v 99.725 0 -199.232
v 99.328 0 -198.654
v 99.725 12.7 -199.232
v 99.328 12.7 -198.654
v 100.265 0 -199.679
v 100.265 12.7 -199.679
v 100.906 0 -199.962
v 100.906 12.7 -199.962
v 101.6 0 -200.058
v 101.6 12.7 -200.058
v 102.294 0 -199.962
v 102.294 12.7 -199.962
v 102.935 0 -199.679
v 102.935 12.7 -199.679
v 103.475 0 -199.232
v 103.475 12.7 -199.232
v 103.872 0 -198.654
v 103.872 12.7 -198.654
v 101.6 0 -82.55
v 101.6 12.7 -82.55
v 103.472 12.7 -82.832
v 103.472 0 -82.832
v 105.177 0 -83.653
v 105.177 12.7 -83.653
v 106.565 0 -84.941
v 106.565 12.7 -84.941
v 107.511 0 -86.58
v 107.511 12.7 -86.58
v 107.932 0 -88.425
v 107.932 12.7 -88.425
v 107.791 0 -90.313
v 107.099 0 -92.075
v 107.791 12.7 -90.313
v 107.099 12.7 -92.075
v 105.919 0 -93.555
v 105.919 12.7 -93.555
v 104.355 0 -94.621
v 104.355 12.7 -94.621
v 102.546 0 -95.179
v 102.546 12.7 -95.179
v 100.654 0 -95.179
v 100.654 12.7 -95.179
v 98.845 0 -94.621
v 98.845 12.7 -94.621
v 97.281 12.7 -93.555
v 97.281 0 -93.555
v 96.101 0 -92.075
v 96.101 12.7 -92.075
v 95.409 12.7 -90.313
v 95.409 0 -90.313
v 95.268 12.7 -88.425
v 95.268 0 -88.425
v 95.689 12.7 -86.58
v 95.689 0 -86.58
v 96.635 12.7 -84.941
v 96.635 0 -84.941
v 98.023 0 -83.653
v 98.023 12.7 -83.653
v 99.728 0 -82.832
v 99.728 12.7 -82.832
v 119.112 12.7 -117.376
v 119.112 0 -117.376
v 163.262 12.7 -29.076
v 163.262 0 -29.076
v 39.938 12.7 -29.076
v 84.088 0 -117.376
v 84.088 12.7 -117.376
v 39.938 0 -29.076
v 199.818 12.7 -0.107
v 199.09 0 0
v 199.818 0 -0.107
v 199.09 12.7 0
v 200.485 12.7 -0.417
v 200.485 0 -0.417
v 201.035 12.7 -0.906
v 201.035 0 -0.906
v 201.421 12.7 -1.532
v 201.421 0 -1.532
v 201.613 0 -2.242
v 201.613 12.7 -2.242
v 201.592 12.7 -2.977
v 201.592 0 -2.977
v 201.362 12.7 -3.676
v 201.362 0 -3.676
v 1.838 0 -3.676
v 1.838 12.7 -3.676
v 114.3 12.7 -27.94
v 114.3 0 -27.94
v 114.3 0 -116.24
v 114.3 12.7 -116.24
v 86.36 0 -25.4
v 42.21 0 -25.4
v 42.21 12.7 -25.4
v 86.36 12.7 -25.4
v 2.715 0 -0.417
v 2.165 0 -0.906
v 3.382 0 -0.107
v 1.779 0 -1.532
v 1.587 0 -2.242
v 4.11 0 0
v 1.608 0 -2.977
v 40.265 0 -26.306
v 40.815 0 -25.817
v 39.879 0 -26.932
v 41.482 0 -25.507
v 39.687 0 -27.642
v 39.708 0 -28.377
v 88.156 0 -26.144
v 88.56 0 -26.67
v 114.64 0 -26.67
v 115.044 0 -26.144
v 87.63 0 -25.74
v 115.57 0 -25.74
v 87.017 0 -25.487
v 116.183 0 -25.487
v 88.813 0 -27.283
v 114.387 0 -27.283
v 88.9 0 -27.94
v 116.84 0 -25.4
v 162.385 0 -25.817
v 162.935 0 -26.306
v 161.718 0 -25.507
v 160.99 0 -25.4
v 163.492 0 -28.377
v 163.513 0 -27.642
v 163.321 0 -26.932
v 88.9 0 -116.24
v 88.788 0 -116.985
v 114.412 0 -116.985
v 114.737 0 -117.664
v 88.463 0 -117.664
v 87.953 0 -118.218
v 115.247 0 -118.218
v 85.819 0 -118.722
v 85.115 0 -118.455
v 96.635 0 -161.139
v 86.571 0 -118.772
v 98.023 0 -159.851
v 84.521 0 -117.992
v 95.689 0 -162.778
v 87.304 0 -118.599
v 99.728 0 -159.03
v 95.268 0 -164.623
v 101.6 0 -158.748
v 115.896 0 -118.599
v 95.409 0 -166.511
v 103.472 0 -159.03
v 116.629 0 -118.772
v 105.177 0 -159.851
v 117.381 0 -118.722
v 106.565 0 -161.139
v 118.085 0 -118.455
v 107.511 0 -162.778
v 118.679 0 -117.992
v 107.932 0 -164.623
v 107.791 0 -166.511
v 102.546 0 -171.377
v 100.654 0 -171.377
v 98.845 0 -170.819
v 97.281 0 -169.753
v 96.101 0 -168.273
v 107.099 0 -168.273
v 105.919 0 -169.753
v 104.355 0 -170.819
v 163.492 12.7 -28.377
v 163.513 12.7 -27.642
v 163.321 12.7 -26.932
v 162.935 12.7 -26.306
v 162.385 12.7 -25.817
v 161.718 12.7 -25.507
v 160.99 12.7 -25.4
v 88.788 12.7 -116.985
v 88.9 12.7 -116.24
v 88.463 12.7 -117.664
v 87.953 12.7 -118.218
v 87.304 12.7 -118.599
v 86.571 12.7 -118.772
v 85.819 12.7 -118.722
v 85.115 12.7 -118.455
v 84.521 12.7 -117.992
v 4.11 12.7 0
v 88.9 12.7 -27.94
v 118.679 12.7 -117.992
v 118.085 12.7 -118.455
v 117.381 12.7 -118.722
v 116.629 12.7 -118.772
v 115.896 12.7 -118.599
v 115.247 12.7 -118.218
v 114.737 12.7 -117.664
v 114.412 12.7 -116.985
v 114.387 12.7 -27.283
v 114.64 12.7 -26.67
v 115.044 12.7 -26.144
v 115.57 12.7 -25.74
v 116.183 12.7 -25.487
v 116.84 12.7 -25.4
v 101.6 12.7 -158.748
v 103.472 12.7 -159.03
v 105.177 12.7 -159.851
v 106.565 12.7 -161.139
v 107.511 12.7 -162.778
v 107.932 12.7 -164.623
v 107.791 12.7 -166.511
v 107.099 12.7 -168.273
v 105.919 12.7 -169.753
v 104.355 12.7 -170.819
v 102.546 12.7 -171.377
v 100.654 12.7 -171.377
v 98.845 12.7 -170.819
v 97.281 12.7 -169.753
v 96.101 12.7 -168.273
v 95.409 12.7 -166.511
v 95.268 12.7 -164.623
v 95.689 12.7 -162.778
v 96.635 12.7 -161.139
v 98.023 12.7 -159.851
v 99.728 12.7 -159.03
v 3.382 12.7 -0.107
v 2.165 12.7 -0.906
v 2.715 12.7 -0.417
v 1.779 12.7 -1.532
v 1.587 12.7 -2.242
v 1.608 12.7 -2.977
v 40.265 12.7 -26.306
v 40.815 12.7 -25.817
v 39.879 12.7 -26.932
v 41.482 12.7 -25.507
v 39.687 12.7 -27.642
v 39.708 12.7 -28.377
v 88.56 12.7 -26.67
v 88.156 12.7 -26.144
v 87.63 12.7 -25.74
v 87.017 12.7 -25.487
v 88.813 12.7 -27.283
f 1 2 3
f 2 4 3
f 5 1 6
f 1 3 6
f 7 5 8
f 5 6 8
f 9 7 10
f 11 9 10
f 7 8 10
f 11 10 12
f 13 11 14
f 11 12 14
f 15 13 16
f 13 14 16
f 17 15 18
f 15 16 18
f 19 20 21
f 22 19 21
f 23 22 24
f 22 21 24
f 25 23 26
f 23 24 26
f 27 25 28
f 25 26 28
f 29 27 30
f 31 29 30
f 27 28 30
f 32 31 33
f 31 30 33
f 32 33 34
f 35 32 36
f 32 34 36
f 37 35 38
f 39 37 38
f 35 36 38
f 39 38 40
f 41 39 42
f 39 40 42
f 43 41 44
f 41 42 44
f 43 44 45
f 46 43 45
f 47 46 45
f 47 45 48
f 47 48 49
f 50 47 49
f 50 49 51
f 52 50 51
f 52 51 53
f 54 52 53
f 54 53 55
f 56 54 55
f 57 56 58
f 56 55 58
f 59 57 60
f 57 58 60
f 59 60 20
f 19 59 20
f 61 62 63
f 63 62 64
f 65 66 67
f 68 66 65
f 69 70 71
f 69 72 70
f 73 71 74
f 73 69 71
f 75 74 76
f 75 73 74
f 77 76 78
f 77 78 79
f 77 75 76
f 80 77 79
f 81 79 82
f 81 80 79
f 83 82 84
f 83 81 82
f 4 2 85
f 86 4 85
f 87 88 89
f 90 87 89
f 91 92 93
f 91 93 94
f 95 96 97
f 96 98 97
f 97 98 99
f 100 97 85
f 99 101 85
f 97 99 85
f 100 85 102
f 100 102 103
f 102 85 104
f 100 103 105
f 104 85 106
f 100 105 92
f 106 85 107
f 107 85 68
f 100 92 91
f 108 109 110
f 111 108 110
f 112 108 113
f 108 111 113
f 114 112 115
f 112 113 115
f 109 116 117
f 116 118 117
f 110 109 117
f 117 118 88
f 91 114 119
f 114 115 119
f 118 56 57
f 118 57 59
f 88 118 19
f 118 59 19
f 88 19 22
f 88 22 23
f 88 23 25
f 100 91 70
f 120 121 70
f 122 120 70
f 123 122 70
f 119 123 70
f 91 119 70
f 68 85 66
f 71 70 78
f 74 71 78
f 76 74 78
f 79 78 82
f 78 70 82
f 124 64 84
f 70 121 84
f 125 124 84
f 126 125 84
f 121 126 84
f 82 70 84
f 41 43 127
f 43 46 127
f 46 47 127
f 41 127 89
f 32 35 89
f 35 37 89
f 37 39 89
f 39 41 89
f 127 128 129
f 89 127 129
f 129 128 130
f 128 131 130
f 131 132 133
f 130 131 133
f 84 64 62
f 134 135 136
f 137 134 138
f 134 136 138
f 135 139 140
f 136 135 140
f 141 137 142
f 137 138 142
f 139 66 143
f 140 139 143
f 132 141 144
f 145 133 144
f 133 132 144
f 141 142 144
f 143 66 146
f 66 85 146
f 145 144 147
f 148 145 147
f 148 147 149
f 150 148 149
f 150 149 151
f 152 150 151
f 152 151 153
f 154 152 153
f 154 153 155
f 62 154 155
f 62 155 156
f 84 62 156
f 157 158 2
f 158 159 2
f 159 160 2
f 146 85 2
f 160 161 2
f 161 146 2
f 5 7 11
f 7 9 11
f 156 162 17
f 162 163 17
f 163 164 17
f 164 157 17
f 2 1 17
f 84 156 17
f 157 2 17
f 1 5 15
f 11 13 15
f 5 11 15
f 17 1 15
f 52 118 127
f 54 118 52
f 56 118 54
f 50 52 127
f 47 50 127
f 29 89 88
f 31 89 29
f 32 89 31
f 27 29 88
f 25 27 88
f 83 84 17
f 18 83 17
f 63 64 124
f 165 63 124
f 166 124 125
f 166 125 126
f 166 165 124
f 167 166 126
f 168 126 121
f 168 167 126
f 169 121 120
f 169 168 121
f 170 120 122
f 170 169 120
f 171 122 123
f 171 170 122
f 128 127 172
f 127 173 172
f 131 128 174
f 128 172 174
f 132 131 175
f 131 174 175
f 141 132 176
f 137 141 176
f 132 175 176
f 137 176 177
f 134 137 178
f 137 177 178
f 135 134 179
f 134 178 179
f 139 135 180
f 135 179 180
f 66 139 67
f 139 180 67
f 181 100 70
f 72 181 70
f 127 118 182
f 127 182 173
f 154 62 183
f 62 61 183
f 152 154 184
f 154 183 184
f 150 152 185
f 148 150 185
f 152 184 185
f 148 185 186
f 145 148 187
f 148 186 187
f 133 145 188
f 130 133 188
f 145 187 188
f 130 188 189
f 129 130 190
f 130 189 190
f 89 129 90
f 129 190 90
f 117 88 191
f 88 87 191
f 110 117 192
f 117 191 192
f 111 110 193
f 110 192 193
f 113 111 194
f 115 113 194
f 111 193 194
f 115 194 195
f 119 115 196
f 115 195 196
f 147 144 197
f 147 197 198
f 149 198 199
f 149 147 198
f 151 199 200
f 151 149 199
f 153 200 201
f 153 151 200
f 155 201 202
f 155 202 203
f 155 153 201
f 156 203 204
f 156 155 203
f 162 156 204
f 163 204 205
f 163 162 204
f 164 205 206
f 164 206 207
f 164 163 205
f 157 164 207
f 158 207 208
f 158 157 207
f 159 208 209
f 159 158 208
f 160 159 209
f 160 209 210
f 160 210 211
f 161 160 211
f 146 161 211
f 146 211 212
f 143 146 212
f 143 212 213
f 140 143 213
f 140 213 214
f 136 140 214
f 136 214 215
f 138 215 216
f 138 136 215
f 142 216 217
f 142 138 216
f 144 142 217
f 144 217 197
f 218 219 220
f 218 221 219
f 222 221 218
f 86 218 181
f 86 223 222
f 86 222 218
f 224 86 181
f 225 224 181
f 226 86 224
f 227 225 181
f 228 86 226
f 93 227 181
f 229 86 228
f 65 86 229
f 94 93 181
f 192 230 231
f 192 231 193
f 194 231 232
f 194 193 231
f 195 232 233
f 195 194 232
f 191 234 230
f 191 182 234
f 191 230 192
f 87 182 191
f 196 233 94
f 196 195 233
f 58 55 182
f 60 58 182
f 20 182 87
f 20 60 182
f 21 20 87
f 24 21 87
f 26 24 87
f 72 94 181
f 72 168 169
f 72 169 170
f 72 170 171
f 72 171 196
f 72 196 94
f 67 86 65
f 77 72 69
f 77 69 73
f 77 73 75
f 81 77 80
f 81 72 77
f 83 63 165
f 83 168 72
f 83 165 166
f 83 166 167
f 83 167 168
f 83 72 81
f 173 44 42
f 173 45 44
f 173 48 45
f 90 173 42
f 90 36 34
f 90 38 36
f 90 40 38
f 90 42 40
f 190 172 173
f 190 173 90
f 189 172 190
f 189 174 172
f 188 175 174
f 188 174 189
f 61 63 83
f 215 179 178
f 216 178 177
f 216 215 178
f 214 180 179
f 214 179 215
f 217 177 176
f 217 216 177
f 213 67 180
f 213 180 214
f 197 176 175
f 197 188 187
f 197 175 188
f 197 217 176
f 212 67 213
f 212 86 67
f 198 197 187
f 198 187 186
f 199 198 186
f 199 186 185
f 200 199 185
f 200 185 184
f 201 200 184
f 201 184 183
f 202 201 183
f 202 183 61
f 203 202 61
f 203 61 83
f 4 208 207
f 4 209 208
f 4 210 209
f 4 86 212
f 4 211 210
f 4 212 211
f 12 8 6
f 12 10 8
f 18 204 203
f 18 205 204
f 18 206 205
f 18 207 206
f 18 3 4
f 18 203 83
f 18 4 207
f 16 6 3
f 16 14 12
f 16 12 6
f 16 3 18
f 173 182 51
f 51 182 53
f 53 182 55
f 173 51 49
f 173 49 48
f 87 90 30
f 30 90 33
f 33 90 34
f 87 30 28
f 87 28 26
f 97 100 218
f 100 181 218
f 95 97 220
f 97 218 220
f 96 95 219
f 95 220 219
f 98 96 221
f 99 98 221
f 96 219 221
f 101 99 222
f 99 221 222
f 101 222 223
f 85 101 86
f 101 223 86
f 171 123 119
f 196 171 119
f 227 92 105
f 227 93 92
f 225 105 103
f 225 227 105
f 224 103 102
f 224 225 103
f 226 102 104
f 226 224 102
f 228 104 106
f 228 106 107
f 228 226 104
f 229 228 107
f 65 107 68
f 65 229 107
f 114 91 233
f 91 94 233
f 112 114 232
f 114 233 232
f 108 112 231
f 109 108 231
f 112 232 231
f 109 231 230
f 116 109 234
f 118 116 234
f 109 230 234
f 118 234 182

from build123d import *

# Parameters (mm, degrees)
BOSS_EXTRUDE1_DEPTH = 12.7
SKETCH2_R           = 6.35
CUT_EXTRUDE5_DEPTH  = 12.7
FILLET1_R           = 2.54
FILLET2_R           = 2.54
SKETCH3_R           = 6.35
CUT_EXTRUDE6_DEPTH  = 12.7


with BuildPart() as part:
    # Sketch1 → Boss-Extrude1 (new body)
    with BuildSketch(Plane(origin=(0, 0, 0), x_dir=(1, 0, 0), z_dir=(0, 1, 0))):
        Polygon((0, 0), (203.2, 0), (101.6, 203.197957893), align=None)
    extrude(amount=BOSS_EXTRUDE1_DEPTH)

    # Sketch2 → Cut-Extrude5 (cut)
    with BuildSketch(Plane(origin=(0, 0, 0), x_dir=(1, 0, 0), z_dir=(0, 1, 0))):
        with Locations(Location((101.6, 165.097957893, 0), (0, 0, 270))):
            Circle(SKETCH2_R)
        Polygon((38.1, 25.4), (88.9, 25.4), (88.9, 127), align=None)
        Polygon((165.1, 25.4), (114.3, 25.4), (114.3, 127), align=None)
    extrude(amount=CUT_EXTRUDE5_DEPTH, mode=Mode.SUBTRACT)

    # Fillet1
    fillet1_edges = [part.edges().sort_by_distance(p)[0] for p in [
        (101.6, 6.35, -203.197957893),
        (203.2, 6.35, 0),
        (0, 6.35, 0),
    ]]
    fillet(fillet1_edges, radius=FILLET1_R)

    # Fillet2
    fillet2_edges = [part.edges().sort_by_distance(p)[0] for p in [
        (38.1, 6.35, -25.4),
        (88.9, 6.35, -25.4),
        (88.9, 6.35, -127),
        (165.1, 6.35, -25.4),
        (114.3, 6.35, -127),
        (114.3, 6.35, -25.4),
    ]]
    fillet(fillet2_edges, radius=FILLET2_R)

    # Sketch3 → Cut-Extrude6 (cut)
    with BuildSketch(Plane(origin=(0, 12.7, 0), x_dir=(1, 0, 0), z_dir=(0, 1, 0))):
        with Locations(Location((101.6, 88.9, 0), (0, 0, 270))):
            Circle(SKETCH3_R)
    extrude(amount=-CUT_EXTRUDE6_DEPTH, mode=Mode.SUBTRACT)


solid = part.part
